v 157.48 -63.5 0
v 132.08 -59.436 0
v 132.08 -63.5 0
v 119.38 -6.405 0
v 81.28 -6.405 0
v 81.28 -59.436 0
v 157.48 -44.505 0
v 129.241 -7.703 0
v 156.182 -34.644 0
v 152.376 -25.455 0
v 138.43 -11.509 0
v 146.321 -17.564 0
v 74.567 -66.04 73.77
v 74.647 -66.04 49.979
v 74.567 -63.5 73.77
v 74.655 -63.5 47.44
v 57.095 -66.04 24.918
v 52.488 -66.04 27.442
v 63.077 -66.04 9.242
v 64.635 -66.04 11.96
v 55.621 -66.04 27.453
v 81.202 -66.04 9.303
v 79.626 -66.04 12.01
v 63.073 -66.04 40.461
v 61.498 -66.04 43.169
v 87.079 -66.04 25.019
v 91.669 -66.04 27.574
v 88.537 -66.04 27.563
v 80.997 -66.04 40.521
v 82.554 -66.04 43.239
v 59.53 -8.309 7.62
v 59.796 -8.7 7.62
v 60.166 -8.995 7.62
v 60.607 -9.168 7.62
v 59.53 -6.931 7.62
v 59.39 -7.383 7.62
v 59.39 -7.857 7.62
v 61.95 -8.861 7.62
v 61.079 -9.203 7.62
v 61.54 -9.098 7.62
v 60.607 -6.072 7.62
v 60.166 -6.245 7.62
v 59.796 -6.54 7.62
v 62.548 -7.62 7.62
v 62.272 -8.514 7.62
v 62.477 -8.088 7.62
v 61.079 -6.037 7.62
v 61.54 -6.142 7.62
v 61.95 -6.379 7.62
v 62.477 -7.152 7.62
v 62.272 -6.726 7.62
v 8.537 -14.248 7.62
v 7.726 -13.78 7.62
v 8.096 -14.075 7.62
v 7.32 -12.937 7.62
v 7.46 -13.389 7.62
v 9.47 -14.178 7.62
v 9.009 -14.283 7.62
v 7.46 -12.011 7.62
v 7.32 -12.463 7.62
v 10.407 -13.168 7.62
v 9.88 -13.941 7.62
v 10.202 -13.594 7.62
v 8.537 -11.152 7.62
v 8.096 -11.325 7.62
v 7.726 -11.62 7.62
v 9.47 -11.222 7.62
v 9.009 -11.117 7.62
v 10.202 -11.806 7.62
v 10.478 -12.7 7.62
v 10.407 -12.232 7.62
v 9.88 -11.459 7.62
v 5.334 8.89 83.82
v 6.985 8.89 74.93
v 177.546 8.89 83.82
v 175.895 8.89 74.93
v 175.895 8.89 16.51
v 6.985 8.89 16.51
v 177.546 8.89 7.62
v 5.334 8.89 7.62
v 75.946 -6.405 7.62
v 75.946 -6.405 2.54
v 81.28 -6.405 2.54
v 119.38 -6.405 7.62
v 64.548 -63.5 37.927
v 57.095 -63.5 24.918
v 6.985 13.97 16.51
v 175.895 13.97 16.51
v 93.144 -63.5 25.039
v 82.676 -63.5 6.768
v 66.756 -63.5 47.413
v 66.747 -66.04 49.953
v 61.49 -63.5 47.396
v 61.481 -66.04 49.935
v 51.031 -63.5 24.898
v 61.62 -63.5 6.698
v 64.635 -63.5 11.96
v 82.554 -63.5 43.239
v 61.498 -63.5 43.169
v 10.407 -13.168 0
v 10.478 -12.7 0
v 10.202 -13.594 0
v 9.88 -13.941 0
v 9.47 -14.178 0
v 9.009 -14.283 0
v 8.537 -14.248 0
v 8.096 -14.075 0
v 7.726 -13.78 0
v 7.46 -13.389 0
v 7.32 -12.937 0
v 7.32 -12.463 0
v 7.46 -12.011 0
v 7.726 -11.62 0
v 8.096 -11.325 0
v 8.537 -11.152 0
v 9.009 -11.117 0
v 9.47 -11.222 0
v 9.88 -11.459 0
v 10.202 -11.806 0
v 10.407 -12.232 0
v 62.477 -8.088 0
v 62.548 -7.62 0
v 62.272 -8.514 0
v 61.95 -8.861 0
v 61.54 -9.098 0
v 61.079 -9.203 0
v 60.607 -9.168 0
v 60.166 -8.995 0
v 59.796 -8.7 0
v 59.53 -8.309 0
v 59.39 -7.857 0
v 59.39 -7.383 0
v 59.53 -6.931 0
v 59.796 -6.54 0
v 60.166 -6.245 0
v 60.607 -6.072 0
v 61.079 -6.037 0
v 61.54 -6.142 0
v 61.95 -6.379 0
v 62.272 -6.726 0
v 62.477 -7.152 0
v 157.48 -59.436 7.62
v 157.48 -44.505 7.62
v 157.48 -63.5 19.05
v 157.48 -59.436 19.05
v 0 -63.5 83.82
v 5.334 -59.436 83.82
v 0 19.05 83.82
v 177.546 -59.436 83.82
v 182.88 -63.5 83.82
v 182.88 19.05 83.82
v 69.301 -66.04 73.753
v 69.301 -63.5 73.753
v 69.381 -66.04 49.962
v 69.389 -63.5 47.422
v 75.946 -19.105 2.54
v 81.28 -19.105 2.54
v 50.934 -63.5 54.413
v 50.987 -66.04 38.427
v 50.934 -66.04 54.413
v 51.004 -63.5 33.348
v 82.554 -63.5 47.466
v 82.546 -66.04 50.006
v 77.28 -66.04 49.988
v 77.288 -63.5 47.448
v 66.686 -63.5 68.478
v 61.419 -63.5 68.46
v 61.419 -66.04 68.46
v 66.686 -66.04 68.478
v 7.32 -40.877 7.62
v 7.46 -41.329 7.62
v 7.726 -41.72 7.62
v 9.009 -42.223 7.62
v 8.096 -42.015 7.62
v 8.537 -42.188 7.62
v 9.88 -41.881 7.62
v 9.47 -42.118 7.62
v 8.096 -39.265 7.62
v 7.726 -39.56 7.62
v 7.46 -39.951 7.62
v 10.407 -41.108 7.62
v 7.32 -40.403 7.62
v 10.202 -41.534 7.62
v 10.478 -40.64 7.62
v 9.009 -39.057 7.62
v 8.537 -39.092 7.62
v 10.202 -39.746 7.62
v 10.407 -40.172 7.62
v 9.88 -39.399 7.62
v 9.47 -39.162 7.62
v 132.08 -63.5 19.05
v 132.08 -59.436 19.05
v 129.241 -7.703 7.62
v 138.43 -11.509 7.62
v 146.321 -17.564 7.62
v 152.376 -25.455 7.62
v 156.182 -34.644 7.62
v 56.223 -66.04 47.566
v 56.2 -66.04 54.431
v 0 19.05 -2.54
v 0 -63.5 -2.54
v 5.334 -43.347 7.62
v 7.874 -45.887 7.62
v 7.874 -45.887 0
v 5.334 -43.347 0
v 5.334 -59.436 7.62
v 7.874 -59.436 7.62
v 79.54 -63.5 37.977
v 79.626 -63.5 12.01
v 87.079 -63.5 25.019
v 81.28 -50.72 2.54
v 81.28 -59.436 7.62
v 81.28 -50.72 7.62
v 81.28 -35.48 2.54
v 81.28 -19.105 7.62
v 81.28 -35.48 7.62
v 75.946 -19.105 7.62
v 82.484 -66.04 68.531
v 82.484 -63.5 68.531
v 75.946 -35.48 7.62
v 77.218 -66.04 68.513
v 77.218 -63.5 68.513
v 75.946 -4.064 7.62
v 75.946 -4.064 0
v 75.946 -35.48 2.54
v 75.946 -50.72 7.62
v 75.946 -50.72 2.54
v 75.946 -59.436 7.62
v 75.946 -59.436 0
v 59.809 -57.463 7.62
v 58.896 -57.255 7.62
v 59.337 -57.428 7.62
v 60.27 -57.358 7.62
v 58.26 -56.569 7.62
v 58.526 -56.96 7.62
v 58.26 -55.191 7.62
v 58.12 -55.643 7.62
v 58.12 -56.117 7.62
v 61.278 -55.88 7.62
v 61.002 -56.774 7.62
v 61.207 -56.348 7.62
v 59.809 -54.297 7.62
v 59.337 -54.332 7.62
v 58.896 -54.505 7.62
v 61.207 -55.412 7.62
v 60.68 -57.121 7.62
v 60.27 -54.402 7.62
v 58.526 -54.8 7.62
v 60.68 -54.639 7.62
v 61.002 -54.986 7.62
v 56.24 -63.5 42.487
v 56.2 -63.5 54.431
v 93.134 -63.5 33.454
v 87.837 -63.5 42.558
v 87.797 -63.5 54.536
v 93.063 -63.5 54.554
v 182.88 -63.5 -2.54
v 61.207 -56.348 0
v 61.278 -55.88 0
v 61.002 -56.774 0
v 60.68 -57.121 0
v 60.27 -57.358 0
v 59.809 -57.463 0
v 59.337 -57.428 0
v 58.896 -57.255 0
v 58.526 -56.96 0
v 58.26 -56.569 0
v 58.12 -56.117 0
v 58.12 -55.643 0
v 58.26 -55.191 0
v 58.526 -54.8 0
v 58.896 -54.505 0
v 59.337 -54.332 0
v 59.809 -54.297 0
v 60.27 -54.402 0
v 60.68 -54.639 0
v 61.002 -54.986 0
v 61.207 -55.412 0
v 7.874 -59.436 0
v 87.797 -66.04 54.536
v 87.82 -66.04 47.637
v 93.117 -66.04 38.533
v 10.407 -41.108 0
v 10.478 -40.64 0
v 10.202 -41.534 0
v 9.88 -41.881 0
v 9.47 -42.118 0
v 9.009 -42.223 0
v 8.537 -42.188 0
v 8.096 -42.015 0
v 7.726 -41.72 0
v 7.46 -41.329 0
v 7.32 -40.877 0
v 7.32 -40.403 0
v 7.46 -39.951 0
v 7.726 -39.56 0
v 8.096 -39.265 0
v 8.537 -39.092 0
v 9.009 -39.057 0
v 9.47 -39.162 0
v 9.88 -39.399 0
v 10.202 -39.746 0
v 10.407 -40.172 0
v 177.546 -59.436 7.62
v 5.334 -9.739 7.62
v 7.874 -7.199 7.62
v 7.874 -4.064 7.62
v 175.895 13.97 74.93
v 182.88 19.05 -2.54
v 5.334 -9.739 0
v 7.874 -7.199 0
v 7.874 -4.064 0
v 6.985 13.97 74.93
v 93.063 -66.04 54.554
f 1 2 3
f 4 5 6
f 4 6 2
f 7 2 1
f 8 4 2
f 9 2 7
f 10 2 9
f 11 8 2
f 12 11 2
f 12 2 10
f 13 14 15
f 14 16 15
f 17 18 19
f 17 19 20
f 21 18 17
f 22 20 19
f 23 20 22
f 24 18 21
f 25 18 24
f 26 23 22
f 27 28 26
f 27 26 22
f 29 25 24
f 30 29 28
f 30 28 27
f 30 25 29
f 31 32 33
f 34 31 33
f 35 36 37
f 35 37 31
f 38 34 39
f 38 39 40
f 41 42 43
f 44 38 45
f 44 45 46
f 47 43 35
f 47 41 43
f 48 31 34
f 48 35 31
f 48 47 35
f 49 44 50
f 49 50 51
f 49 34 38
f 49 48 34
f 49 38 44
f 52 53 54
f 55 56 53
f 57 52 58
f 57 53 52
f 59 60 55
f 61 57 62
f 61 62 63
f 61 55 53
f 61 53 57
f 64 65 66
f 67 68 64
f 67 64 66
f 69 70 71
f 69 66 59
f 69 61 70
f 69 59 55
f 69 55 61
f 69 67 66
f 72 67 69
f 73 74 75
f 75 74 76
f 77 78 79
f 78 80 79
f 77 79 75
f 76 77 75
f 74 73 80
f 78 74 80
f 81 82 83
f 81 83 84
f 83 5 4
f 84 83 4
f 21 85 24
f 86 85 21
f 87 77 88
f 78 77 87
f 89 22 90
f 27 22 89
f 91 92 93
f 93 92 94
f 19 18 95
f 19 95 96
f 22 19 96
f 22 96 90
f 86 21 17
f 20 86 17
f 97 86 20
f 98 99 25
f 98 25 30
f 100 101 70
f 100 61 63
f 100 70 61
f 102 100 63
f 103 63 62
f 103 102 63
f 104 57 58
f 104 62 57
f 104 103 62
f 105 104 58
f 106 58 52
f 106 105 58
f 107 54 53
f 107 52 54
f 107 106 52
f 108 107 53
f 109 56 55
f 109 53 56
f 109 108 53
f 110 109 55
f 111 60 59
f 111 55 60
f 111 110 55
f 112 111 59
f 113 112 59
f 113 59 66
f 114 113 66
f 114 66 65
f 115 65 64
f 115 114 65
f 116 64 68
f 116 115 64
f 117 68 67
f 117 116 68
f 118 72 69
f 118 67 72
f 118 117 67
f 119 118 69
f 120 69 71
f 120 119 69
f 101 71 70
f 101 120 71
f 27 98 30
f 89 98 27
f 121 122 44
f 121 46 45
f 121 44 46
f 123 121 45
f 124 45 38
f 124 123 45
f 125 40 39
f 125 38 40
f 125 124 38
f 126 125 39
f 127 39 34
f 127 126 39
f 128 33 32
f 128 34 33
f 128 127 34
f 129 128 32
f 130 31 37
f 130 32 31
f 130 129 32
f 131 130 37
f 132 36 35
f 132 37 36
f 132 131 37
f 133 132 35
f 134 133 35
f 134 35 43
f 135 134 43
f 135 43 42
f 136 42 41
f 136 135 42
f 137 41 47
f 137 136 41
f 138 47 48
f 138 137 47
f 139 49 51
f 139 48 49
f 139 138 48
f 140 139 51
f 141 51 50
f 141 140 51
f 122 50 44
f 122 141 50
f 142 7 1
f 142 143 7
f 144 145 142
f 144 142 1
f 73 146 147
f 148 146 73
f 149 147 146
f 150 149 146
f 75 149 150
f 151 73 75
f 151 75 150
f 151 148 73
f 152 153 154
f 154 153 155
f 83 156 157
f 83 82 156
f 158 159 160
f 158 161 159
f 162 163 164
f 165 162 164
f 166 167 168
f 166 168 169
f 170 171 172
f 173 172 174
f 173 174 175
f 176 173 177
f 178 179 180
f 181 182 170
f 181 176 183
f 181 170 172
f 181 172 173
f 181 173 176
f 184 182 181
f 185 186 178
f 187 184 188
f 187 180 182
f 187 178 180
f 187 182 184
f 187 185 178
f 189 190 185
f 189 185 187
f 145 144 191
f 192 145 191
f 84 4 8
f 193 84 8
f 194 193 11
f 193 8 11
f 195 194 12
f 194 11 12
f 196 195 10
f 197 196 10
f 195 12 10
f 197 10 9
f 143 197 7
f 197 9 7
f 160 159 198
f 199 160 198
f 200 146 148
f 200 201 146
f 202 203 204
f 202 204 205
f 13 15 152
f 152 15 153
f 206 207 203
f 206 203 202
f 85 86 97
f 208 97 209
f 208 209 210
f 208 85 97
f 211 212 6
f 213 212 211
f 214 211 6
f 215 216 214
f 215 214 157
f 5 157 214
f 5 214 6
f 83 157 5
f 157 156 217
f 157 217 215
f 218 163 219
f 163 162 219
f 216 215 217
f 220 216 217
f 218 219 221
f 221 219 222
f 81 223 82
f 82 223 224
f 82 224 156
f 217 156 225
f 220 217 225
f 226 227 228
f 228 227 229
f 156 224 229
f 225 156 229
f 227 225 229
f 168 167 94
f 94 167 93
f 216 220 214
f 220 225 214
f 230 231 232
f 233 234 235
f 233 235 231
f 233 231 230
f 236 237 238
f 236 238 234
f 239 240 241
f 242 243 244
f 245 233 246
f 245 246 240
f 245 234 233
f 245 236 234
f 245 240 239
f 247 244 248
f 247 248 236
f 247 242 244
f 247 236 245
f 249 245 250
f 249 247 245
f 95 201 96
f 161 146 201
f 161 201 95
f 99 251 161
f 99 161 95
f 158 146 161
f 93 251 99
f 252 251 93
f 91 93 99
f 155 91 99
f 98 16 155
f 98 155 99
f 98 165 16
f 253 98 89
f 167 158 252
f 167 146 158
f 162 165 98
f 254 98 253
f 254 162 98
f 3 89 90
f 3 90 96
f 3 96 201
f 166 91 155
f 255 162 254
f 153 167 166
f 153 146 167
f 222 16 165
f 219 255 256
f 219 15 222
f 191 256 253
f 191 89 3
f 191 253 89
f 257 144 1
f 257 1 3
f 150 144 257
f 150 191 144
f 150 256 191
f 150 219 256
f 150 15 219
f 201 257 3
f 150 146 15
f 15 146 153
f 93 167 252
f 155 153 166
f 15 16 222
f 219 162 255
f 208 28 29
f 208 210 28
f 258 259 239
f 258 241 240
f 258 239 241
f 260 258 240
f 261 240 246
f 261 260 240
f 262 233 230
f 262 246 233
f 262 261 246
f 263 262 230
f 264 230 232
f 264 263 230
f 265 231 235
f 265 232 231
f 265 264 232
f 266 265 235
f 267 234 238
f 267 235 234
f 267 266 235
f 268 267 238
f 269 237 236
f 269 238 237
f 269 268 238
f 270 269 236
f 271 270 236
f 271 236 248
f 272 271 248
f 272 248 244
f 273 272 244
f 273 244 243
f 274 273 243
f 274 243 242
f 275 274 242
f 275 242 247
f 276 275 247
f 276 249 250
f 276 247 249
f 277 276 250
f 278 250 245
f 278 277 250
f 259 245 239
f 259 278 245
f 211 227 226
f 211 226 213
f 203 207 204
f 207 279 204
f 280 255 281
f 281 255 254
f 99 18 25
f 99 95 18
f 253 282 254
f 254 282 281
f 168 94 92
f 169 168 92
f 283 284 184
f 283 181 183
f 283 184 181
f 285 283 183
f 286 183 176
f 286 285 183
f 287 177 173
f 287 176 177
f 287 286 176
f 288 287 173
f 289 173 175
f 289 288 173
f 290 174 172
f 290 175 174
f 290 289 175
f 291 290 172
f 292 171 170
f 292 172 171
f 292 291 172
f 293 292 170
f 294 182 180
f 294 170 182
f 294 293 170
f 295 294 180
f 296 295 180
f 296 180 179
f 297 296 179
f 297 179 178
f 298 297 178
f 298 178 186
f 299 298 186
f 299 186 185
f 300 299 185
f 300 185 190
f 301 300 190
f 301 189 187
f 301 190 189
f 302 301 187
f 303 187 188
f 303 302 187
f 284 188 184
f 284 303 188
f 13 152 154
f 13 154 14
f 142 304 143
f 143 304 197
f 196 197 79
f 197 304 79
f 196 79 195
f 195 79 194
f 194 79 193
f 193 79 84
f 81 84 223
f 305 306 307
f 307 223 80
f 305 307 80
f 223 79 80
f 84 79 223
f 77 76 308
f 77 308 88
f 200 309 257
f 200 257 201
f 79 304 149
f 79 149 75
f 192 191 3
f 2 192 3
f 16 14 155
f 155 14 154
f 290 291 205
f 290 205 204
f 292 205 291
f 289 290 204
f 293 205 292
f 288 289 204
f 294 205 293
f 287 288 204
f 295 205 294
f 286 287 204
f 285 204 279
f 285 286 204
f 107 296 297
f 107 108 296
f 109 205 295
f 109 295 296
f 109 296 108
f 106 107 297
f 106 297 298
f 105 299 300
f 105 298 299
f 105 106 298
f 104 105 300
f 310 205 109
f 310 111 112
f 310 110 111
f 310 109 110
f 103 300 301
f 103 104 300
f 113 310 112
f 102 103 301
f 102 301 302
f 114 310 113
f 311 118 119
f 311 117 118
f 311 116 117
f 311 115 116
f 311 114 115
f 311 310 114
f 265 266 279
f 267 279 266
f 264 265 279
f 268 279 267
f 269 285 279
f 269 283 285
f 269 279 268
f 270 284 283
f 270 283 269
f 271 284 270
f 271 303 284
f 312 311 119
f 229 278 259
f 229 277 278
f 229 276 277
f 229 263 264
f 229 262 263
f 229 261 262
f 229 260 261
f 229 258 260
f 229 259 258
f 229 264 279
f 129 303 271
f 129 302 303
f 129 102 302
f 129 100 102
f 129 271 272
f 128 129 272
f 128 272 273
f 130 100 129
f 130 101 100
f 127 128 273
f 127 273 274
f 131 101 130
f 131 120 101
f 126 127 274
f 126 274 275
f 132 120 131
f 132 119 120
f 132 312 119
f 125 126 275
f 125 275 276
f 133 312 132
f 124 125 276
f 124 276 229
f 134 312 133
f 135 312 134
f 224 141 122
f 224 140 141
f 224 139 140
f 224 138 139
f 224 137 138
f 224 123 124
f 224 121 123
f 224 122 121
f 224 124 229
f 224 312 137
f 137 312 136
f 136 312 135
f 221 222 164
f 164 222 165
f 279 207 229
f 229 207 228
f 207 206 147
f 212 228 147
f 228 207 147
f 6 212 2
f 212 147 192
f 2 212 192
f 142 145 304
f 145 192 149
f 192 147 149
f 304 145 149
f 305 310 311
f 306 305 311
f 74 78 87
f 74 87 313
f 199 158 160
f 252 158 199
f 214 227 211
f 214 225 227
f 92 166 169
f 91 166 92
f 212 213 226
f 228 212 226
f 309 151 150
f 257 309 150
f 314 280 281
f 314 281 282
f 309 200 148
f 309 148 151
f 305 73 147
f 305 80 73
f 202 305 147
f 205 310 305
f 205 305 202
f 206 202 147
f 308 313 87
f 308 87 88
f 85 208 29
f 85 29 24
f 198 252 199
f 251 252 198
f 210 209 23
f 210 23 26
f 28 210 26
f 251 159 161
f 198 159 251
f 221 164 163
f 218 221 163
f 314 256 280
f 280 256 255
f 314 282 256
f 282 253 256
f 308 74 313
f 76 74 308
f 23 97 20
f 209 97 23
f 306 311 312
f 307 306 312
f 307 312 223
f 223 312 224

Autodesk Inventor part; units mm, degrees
ref_plane "YZ Plane" through (0, 0, 0) normal (1, 0, 0) x (0, 1, 0)
ref_plane "XZ Plane" through (0, 0, 0) normal (0, 1, 0) x (-1, 0, 0)
ref_plane "XY Plane" through (0, 0, 0) normal (0, 0, 1) x (1, 0, 0)
sketch "Sketch1" plane through (0, 0, 0) normal (0, 0, 1) x (1, 0, 0)
  line L0 (6.35, -116.84) -> (8.89, -119.38)
  line L1 (8.89, -119.38) -> (8.89, -121.92)
  line L2 (6.35, -84.074) -> (6.35, -116.84)
  line L3 (8.89, -81.534) -> (6.35, -84.074)
  line L4 (8.89, -68.58) -> (8.89, -81.534)
  line L5 (74.93, -68.58) -> (8.89, -68.58)
  line L6 (74.93, -121.92) -> (74.93, -68.58)
  line L7 (8.89, -121.92) -> (74.93, -121.92)
  line L8 (5.334, -117.2608) -> (7.874, -119.8008)
  line L9 (7.874, -119.8008) -> (7.874, -122.936)
  line L10 (7.874, -122.936) -> (75.946, -122.936)
  line L11 (75.946, -122.936) -> (75.946, -67.564)
  line L12 (75.946, -67.564) -> (7.874, -67.564)
  line L13 (7.874, -67.564) -> (7.874, -81.1132)
  line L14 (7.874, -81.1132) -> (5.334, -83.6532)
  line L15 (5.334, -83.6532) -> (5.334, -117.2608)
  line L16 (0, -63.5) -> (81.28, -63.5)
  line L17 (81.28, -63.5) -> (81.28, 0)
  line L18 (81.28, 0) -> (0, 0)
  line L19 (0, 0) -> (0, -63.5)
  line L20 (5.334, -111.1172) -> (0, -111.1172) construction
  line L21 (75.946, -101.4463) -> (81.28, -101.4463) construction
  line L22 (34.5139, -122.936) -> (34.5139, -63.5) construction
  line L23 (37.8868, -59.436) -> (37.8868, 0) construction
  line L24 (75.946, -76.28) -> (81.28, -76.28)
  line L25 (75.946, -120.595) -> (81.28, -120.595)
  line L26 (75.946, -107.895) -> (81.28, -107.895)
  line L27 (75.946, -91.52) -> (79.6093, -91.52)
  line L28 (81.28, -89.46) -> (81.28, -78.34)
  line L29 (76.835, -110.245) -> (76.835, -118.245)
  circle A0 centre (8.89, -114.3) radius 1.5875
  circle A1 centre (60.96, -119.38) radius 1.5875
  circle A2 centre (59.69, -71.12) radius 1.5875
  circle A3 centre (8.89, -86.36) radius 1.5875
  circle A4 centre (8.89, -114.3) radius 1.0795
  circle A5 centre (8.89, -86.36) radius 1.0795
  circle A6 centre (59.69, -71.12) radius 1.0795
  circle A7 centre (60.96, -119.38) radius 1.0795
  circle A8 centre (40.64, -95.2527) radius 8.89
  line L30 (6.35, -10.16) -> (8.89, -7.62)
  line L31 (8.89, -7.62) -> (8.89, -5.08)
  line L32 (6.35, -42.926) -> (6.35, -10.16)
  line L33 (8.89, -45.466) -> (6.35, -42.926)
  line L34 (8.89, -58.42) -> (8.89, -45.466)
  line L35 (74.93, -58.42) -> (8.89, -58.42)
  line L36 (74.93, -5.08) -> (74.93, -58.42)
  line L37 (8.89, -5.08) -> (74.93, -5.08)
  line L38 (5.334, -9.7392) -> (7.874, -7.1992)
  line L39 (7.874, -7.1992) -> (7.874, -4.064)
  line L40 (7.874, -4.064) -> (75.946, -4.064)
  line L41 (75.946, -4.064) -> (75.946, -59.436)
  line L42 (75.946, -59.436) -> (7.874, -59.436)
  line L43 (7.874, -59.436) -> (7.874, -45.8868)
  line L44 (7.874, -45.8868) -> (5.334, -43.3468)
  line L45 (5.334, -43.3468) -> (5.334, -9.7392)
  line L46 (5.334, -15.8828) -> (0, -15.8828) construction
  line L47 (75.946, -25.5537) -> (81.28, -25.5537) construction
  line L48 (75.946, -50.72) -> (81.28, -50.72)
  line L49 (75.946, -6.405) -> (81.28, -6.405)
  line L50 (75.946, -19.105) -> (81.28, -19.105)
  line L51 (75.946, -35.48) -> (81.28, -35.48)
  line L52 (81.28, -37.54) -> (81.28, -48.66)
  line L53 (76.835, -16.755) -> (76.835, -8.755)
  circle A9 centre (8.89, -12.7) radius 1.5875
  circle A10 centre (60.96, -7.62) radius 1.5875
  circle A11 centre (59.69, -55.88) radius 1.5875
  circle A12 centre (8.89, -40.64) radius 1.5875
  circle A13 centre (8.89, -12.7) radius 1.0795
  circle A14 centre (8.89, -40.64) radius 1.0795
  circle A15 centre (59.69, -55.88) radius 1.0795
  circle A16 centre (60.96, -7.62) radius 1.0795
  circle A17 centre (40.64, -31.7473) radius 8.89
  point P0 (0, 0)
  point P1 (81.28, -130.1977)
  point P2 (77.7776, -91.52)
  point P3 (81.28, -83.9)
  point P4 (76.835, -114.245)
  point P5 (8.89, -120.65)
  point P6 (41.91, -121.92)
  point P7 (81.28, 3.1977)
  point P8 (34.5139, -4.064)
  point P9 (79.6093, -35.48)
  point P10 (77.7776, -35.48)
  point P11 (81.28, -43.1)
  point P12 (76.835, -12.755)
  point P13 (8.89, -6.35)
  point P14 (41.91, -5.08)
  dimension "d0" = 1.016
  dimension "d1" = 81.28
  dimension "d2" = 63.5
  dimension "d3" = 15.24
  dimension "d4" = 7.62
  dimension "d5" = 12.7
  dimension "d6" = 6.35
  dimension "d7" = 2.159
  dimension "d8" = 2.159
  dimension "d9" = 2.159
  dimension "d10" = 2.159
  dimension "d38" = 17.78
  dimension "d40" = 40.64
  dimension "d93" = 5.334
  dimension "d94" = 63.5
  dimension "d96" = 55.372
  dimension "d97" = 4.064
  dimension "d98" = 4.6592
  dimension "d99" = 2.54
  dimension "d100" = 12.954
  dimension "d101" = 12.5332
  dimension "d102" = 15.0732
  dimension "d103" = 15.494
  dimension "d104" = 6.35
  dimension "d105" = 35.56
  dimension "d106" = 2.54
  dimension "d107" = 50.8
  dimension "d108" = 6.1261
  dimension "d109" = 1.27
  dimension "d110" = 26.6673
extrude "Extrusion1" add sketch "Sketch1" against normal blind 2.54 contours L19 L18 L17 L49 L41 L40 L39 L38 L45 L44 L43 L42 L48 L16 | L48 L41 L51 L17 | L41 L42 L43 L44 L45 L38 L39 L40 | L17 L50 L41 L49 | L41 L50 L17 L51 | L30 L31 L37 L36 L35 L34 L33 L32 | A9 | A10 | A11 | A12 | A13 | A14 | A15 | A16 | A17
extrude "Extrusion2" add sketch "Sketch1" along normal blind 7.62 contours L19 L18 L17 L49 L41 L40 L39 L38 L45 L44 L43 L42 L48 L16 | L41 L50 L17 L51 | A9 | A10 | A11 | A12 | A13 | A14 | A15 | A16
extrude "Extrusion4" add sketch "Sketch1" along normal blind 2.54 contours L19 L18 L17 L49 L41 L40 L39 L38 L45 L44 L43 L42 L48 L16 | L48 L41 L51 L17 | L17 L50 L41 L49 | L41 L50 L17 L51 | A9 | A10 | A11 | A12 | A13 | A14 | A15 | A16
sketch "Sketch9" plane through (0, 0, -2.54) normal (0, 0, -1) x (-1, 0, 0)
  line L0 (-81.28, -6.405) -> (-81.28, 0) projected
  line L1 (0, 0) -> (-81.28, 0)
  line L2 (-81.28, -63.5) -> (0, -63.5) projected
  line L3 (-81.28, 0) -> (-81.28, -63.5)
  line L4 (-81.28, -63.5) -> (-182.88, -63.5)
  line L5 (-182.88, -63.5) -> (-182.88, 19.05)
  line L6 (-182.88, 19.05) -> (0, 19.05)
  line L7 (0, 19.05) -> (0, 0)
  dimension "d115" = 182.88
  dimension "d116" = 19.05
extrude "Extrusion14" add sketch "Sketch9" against normal up to surface (10.16 mm away)
sketch "Sketch10" plane through (0, 0, 7.62) normal (0, 0, 1) x (1, 0, 0)
  line L0 (81.28, -19.105) -> (81.28, -6.405) projected
  line L1 (81.28, -50.72) -> (81.28, -35.48) projected
  line L2 (0, -63.5) -> (182.88, -63.5) projected
  line L3 (81.28, -6.405) -> (157.48, -6.405)
  line L4 (157.48, -6.405) -> (157.48, -63.5)
  line L5 (157.48, -63.5) -> (81.28, -63.5)
  line L6 (81.28, -63.5) -> (81.28, -6.405)
  point P0 (0, 0)
  dimension "d119" = 76.2
extrude "Extrusion15" cut sketch "Sketch10" against normal up to surface (7.62 mm away)
fillet "Fillet1" radius 38.1 1 edges at (157.48, -6.405, 3.81)
sketch "Sketch11" plane through (0, 19.05, -2.54) normal (0, 1, 0) x (1, 0, 0)
  line L0 (0, 0) -> (0, -10.16) projected
  line L1 (0, 0) -> (182.88, 0)
  line L2 (182.88, 0) -> (182.88, -86.36)
  line L3 (182.88, -86.36) -> (0, -86.36)
  line L4 (0, -86.36) -> (0, 0)
  line L5 (182.88, 0) -> (182.88, -10.16) projected
  line L6 (0, -10.16) -> (182.88, -10.16) projected
  point P0 (0, -2.54)
  dimension "d123" = 76.2
extrude "Extrusion16" add sketch "Sketch11" against normal blind 10.16 contours L6 L2 L3 L4
sketch "Sketch12" plane through (0, 8.89, -2.54) normal (0, -1, 0) x (1, 0, 0)
  line L0 (6.985, 77.47) -> (175.895, 77.47)
  line L1 (175.895, 77.47) -> (175.895, 19.05)
  line L2 (175.895, 19.05) -> (6.985, 19.05)
  line L3 (6.985, 19.05) -> (6.985, 77.47)
  line L4 (0, 86.36) -> (0, 10.16) projected
  line L5 (182.88, 86.36) -> (0, 86.36) projected
  point P0 (0, 2.54)
  point P1 (91.44, 77.47)
  point P2 (91.44, 86.36)
  point P3 (6.985, 48.26)
  point P4 (0, 48.26)
  dimension "d126" = 168.91
  dimension "d127" = 58.42
extrude "Extrusion17" cut sketch "Sketch12" against normal blind 5.08
sketch "Sketch13" plane through (0, 0, 7.62) normal (0, 0, 1) x (1, 0, 0)
  line L0 (182.88, 8.89) -> (0, 8.89) projected
  line L1 (5.334, 8.89) -> (5.334, -59.436)
  line L2 (5.334, -59.436) -> (177.546, -59.436)
  line L3 (177.546, -59.436) -> (177.546, 8.89)
  line L4 (182.88, 8.89) -> (182.88, -63.5) projected
  line L5 (0, -63.5) -> (0, 8.89) projected
  line L6 (0, -63.5) -> (81.28, -63.5) projected
  line L7 (157.48, -63.5) -> (81.28, -63.5) projected
  line L8 (157.48, -63.5) -> (182.88, -63.5) projected
  point P0 (0, 0)
  point P1 (7.874, -59.436)
  point P2 (5.334, -43.3468)
  point P3 (177.546, -25.273)
  dimension "d131" = 5.334
extrude "Extrusion18" add sketch "Sketch13" along normal up to surface (76.2 mm away) contours L4 L8 L7 L6 L5 L0 L1 L2 L3
sketch "Sketch14" plane through (0, -63.5, -2.54) normal (0, -1, 0) x (1, 0, 0)
  line L0 (81.28, 10.16) -> (157.48, 10.16) projected
  line L1 (81.28, 5.08) -> (81.28, 10.16) projected
  line L2 (81.28, 10.16) -> (157.48, 10.16)
  line L3 (157.48, 10.16) -> (157.48, 21.59)
  line L4 (157.48, 21.59) -> (81.28, 21.59)
  line L5 (81.28, 21.59) -> (81.28, 10.16)
  line L6 (157.48, 2.54) -> (81.28, 2.54) projected
  point P0 (0, 2.54)
  dimension "d134" = 19.05
extrude "Extrusion19" cut sketch "Sketch14" against normal blind 20.6375
sketch "Sketch15" plane through (0, -63.5, -2.54) normal (0, -1, 0) x (1, 0, 0)
  line L0 (81.28, 21.59) -> (81.28, 10.16) projected
  line L1 (157.48, 2.54) -> (119.38, 2.54) projected
  line L2 (81.28, 21.59) -> (132.08, 21.59)
  line L3 (132.08, 21.59) -> (132.08, 2.54)
  line L4 (132.08, 2.54) -> (81.28, 2.54)
  line L5 (81.28, 2.54) -> (81.28, 21.59)
  line L6 (157.48, 21.59) -> (157.48, 2.54) projected
  point P0 (0, 2.54)
  dimension "d137" = 25.4
extrude "Extrusion20" add sketch "Sketch15" against normal up to surface (4.064 mm away)
sketch "Sketch16" plane through (0, -63.5, -2.54) normal (0, -1, 0) x (1, 0, 0)
  line L0 (82.6763, 9.3083) -> (61.6198, 9.2379)
  line L1 (61.6198, 9.2379) -> (51.0306, 27.4381)
  line L2 (51.0306, 27.4381) -> (61.4978, 45.7088)
  line L3 (61.4978, 45.7088) -> (82.5543, 45.7792)
  line L4 (82.5543, 45.7792) -> (93.1436, 27.579)
  line L5 (93.1436, 27.579) -> (82.6763, 9.3083)
  line L6 (64.5477, 40.4668) -> (57.0952, 27.4584)
  line L7 (57.0952, 27.4584) -> (64.6346, 14.5002)
  line L8 (64.6346, 14.5002) -> (79.6264, 14.5503)
  line L9 (79.6264, 14.5503) -> (87.0789, 27.5587)
  line L10 (87.0789, 27.5587) -> (79.5395, 40.5169)
  line L11 (79.5395, 40.5169) -> (64.5477, 40.4668)
  line L12 (51.0044, 35.8885) -> (50.9339, 56.9531)
  line L13 (50.9339, 56.9531) -> (56.2001, 56.9707)
  line L14 (56.2001, 56.9707) -> (56.24, 45.0273)
  line L15 (56.24, 45.0273) -> (51.0044, 35.8885)
  line L16 (61.4193, 71.0002) -> (66.6855, 71.0179)
  line L17 (66.6855, 71.0179) -> (66.7559, 49.9533)
  line L18 (82.5544, 50.0062) -> (82.4839, 71.0707)
  line L19 (82.4839, 71.0707) -> (77.2177, 71.0531)
  line L20 (77.2177, 71.0531) -> (77.2882, 49.9885)
  line L21 (93.1336, 35.9943) -> (93.063, 57.094)
  line L22 (93.063, 57.094) -> (87.7969, 57.0764)
  line L23 (87.7969, 57.0764) -> (87.837, 45.0979)
  line L24 (87.837, 45.0979) -> (93.1336, 35.9943)
  line L25 (69.3009, 76.2928) -> (69.389, 49.9621)
  line L26 (69.389, 49.9621) -> (74.6552, 49.9797)
  line L27 (74.6552, 49.9797) -> (74.5671, 76.3104)
  line L28 (74.5671, 76.3104) -> (69.3009, 76.2928)
  line L29 (77.2882, 49.9885) -> (82.5544, 50.0062)
  line L30 (66.6855, 71.0179) -> (69.3185, 71.0267) construction
  line L31 (77.2177, 71.0531) -> (74.5847, 71.0443) construction
  line L32 (61.4193, 71.0002) -> (61.4898, 49.9357)
  line L33 (61.4898, 49.9357) -> (66.7559, 49.9533)
  point P0 (0, 2.54)
  point P1 (72.0871, 27.5085)
  point P2 (95.9605, 86.1193)
  dimension "d140" = 21.0566
  dimension "d141" = 5.2522
  dimension "d142" = 4.2234
  dimension "d143" = 4.2234
  dimension "d144" = 5.2662
  dimension "d145" = 5.2662
  dimension "d146" = 5.2662
  dimension "d147" = 5.2662
  dimension "d148" = 4.2269
  dimension "d149" = 21.0647
  dimension "d150" = 21.0647
  dimension "d151" = 26.3309
  dimension "d152" = 5.2662
  dimension "d153" = 5.2662
  dimension "d154" = 5.2662
  dimension "d155" = 2.6331
  dimension "d156" = 5.2578
extrude "Extrusion21" add sketch "Sketch16" along normal blind 2.54
chamfer "Chamfer3" distance 2.54 angle 45 11 edges at (90.4853, -66.04, 38.0061) (79.9213, -66.04, 47.4573) (72.0221, -66.04, 47.4309) (64.1229, -66.04, 47.4045) (53.6222, -66.04, 37.9179) (56.3252, -66.04, 15.798) (72.1481, -66.04, 6.7331) (87.9099, -66.04, 15.9036) (83.3092, -66.04, 31.4978) (72.0436, -66.04, 37.9518) (60.8215, -66.04, 31.4226)
equation "\"d4\" = 0.5 * d3"
equation "\"d6\" = 0.5 * d5"
equation "\"d8\" = d7"
equation "\"d9\" = d7"
equation "\"d10\" = d7"
properties part number "Liv Mas Base Box"
